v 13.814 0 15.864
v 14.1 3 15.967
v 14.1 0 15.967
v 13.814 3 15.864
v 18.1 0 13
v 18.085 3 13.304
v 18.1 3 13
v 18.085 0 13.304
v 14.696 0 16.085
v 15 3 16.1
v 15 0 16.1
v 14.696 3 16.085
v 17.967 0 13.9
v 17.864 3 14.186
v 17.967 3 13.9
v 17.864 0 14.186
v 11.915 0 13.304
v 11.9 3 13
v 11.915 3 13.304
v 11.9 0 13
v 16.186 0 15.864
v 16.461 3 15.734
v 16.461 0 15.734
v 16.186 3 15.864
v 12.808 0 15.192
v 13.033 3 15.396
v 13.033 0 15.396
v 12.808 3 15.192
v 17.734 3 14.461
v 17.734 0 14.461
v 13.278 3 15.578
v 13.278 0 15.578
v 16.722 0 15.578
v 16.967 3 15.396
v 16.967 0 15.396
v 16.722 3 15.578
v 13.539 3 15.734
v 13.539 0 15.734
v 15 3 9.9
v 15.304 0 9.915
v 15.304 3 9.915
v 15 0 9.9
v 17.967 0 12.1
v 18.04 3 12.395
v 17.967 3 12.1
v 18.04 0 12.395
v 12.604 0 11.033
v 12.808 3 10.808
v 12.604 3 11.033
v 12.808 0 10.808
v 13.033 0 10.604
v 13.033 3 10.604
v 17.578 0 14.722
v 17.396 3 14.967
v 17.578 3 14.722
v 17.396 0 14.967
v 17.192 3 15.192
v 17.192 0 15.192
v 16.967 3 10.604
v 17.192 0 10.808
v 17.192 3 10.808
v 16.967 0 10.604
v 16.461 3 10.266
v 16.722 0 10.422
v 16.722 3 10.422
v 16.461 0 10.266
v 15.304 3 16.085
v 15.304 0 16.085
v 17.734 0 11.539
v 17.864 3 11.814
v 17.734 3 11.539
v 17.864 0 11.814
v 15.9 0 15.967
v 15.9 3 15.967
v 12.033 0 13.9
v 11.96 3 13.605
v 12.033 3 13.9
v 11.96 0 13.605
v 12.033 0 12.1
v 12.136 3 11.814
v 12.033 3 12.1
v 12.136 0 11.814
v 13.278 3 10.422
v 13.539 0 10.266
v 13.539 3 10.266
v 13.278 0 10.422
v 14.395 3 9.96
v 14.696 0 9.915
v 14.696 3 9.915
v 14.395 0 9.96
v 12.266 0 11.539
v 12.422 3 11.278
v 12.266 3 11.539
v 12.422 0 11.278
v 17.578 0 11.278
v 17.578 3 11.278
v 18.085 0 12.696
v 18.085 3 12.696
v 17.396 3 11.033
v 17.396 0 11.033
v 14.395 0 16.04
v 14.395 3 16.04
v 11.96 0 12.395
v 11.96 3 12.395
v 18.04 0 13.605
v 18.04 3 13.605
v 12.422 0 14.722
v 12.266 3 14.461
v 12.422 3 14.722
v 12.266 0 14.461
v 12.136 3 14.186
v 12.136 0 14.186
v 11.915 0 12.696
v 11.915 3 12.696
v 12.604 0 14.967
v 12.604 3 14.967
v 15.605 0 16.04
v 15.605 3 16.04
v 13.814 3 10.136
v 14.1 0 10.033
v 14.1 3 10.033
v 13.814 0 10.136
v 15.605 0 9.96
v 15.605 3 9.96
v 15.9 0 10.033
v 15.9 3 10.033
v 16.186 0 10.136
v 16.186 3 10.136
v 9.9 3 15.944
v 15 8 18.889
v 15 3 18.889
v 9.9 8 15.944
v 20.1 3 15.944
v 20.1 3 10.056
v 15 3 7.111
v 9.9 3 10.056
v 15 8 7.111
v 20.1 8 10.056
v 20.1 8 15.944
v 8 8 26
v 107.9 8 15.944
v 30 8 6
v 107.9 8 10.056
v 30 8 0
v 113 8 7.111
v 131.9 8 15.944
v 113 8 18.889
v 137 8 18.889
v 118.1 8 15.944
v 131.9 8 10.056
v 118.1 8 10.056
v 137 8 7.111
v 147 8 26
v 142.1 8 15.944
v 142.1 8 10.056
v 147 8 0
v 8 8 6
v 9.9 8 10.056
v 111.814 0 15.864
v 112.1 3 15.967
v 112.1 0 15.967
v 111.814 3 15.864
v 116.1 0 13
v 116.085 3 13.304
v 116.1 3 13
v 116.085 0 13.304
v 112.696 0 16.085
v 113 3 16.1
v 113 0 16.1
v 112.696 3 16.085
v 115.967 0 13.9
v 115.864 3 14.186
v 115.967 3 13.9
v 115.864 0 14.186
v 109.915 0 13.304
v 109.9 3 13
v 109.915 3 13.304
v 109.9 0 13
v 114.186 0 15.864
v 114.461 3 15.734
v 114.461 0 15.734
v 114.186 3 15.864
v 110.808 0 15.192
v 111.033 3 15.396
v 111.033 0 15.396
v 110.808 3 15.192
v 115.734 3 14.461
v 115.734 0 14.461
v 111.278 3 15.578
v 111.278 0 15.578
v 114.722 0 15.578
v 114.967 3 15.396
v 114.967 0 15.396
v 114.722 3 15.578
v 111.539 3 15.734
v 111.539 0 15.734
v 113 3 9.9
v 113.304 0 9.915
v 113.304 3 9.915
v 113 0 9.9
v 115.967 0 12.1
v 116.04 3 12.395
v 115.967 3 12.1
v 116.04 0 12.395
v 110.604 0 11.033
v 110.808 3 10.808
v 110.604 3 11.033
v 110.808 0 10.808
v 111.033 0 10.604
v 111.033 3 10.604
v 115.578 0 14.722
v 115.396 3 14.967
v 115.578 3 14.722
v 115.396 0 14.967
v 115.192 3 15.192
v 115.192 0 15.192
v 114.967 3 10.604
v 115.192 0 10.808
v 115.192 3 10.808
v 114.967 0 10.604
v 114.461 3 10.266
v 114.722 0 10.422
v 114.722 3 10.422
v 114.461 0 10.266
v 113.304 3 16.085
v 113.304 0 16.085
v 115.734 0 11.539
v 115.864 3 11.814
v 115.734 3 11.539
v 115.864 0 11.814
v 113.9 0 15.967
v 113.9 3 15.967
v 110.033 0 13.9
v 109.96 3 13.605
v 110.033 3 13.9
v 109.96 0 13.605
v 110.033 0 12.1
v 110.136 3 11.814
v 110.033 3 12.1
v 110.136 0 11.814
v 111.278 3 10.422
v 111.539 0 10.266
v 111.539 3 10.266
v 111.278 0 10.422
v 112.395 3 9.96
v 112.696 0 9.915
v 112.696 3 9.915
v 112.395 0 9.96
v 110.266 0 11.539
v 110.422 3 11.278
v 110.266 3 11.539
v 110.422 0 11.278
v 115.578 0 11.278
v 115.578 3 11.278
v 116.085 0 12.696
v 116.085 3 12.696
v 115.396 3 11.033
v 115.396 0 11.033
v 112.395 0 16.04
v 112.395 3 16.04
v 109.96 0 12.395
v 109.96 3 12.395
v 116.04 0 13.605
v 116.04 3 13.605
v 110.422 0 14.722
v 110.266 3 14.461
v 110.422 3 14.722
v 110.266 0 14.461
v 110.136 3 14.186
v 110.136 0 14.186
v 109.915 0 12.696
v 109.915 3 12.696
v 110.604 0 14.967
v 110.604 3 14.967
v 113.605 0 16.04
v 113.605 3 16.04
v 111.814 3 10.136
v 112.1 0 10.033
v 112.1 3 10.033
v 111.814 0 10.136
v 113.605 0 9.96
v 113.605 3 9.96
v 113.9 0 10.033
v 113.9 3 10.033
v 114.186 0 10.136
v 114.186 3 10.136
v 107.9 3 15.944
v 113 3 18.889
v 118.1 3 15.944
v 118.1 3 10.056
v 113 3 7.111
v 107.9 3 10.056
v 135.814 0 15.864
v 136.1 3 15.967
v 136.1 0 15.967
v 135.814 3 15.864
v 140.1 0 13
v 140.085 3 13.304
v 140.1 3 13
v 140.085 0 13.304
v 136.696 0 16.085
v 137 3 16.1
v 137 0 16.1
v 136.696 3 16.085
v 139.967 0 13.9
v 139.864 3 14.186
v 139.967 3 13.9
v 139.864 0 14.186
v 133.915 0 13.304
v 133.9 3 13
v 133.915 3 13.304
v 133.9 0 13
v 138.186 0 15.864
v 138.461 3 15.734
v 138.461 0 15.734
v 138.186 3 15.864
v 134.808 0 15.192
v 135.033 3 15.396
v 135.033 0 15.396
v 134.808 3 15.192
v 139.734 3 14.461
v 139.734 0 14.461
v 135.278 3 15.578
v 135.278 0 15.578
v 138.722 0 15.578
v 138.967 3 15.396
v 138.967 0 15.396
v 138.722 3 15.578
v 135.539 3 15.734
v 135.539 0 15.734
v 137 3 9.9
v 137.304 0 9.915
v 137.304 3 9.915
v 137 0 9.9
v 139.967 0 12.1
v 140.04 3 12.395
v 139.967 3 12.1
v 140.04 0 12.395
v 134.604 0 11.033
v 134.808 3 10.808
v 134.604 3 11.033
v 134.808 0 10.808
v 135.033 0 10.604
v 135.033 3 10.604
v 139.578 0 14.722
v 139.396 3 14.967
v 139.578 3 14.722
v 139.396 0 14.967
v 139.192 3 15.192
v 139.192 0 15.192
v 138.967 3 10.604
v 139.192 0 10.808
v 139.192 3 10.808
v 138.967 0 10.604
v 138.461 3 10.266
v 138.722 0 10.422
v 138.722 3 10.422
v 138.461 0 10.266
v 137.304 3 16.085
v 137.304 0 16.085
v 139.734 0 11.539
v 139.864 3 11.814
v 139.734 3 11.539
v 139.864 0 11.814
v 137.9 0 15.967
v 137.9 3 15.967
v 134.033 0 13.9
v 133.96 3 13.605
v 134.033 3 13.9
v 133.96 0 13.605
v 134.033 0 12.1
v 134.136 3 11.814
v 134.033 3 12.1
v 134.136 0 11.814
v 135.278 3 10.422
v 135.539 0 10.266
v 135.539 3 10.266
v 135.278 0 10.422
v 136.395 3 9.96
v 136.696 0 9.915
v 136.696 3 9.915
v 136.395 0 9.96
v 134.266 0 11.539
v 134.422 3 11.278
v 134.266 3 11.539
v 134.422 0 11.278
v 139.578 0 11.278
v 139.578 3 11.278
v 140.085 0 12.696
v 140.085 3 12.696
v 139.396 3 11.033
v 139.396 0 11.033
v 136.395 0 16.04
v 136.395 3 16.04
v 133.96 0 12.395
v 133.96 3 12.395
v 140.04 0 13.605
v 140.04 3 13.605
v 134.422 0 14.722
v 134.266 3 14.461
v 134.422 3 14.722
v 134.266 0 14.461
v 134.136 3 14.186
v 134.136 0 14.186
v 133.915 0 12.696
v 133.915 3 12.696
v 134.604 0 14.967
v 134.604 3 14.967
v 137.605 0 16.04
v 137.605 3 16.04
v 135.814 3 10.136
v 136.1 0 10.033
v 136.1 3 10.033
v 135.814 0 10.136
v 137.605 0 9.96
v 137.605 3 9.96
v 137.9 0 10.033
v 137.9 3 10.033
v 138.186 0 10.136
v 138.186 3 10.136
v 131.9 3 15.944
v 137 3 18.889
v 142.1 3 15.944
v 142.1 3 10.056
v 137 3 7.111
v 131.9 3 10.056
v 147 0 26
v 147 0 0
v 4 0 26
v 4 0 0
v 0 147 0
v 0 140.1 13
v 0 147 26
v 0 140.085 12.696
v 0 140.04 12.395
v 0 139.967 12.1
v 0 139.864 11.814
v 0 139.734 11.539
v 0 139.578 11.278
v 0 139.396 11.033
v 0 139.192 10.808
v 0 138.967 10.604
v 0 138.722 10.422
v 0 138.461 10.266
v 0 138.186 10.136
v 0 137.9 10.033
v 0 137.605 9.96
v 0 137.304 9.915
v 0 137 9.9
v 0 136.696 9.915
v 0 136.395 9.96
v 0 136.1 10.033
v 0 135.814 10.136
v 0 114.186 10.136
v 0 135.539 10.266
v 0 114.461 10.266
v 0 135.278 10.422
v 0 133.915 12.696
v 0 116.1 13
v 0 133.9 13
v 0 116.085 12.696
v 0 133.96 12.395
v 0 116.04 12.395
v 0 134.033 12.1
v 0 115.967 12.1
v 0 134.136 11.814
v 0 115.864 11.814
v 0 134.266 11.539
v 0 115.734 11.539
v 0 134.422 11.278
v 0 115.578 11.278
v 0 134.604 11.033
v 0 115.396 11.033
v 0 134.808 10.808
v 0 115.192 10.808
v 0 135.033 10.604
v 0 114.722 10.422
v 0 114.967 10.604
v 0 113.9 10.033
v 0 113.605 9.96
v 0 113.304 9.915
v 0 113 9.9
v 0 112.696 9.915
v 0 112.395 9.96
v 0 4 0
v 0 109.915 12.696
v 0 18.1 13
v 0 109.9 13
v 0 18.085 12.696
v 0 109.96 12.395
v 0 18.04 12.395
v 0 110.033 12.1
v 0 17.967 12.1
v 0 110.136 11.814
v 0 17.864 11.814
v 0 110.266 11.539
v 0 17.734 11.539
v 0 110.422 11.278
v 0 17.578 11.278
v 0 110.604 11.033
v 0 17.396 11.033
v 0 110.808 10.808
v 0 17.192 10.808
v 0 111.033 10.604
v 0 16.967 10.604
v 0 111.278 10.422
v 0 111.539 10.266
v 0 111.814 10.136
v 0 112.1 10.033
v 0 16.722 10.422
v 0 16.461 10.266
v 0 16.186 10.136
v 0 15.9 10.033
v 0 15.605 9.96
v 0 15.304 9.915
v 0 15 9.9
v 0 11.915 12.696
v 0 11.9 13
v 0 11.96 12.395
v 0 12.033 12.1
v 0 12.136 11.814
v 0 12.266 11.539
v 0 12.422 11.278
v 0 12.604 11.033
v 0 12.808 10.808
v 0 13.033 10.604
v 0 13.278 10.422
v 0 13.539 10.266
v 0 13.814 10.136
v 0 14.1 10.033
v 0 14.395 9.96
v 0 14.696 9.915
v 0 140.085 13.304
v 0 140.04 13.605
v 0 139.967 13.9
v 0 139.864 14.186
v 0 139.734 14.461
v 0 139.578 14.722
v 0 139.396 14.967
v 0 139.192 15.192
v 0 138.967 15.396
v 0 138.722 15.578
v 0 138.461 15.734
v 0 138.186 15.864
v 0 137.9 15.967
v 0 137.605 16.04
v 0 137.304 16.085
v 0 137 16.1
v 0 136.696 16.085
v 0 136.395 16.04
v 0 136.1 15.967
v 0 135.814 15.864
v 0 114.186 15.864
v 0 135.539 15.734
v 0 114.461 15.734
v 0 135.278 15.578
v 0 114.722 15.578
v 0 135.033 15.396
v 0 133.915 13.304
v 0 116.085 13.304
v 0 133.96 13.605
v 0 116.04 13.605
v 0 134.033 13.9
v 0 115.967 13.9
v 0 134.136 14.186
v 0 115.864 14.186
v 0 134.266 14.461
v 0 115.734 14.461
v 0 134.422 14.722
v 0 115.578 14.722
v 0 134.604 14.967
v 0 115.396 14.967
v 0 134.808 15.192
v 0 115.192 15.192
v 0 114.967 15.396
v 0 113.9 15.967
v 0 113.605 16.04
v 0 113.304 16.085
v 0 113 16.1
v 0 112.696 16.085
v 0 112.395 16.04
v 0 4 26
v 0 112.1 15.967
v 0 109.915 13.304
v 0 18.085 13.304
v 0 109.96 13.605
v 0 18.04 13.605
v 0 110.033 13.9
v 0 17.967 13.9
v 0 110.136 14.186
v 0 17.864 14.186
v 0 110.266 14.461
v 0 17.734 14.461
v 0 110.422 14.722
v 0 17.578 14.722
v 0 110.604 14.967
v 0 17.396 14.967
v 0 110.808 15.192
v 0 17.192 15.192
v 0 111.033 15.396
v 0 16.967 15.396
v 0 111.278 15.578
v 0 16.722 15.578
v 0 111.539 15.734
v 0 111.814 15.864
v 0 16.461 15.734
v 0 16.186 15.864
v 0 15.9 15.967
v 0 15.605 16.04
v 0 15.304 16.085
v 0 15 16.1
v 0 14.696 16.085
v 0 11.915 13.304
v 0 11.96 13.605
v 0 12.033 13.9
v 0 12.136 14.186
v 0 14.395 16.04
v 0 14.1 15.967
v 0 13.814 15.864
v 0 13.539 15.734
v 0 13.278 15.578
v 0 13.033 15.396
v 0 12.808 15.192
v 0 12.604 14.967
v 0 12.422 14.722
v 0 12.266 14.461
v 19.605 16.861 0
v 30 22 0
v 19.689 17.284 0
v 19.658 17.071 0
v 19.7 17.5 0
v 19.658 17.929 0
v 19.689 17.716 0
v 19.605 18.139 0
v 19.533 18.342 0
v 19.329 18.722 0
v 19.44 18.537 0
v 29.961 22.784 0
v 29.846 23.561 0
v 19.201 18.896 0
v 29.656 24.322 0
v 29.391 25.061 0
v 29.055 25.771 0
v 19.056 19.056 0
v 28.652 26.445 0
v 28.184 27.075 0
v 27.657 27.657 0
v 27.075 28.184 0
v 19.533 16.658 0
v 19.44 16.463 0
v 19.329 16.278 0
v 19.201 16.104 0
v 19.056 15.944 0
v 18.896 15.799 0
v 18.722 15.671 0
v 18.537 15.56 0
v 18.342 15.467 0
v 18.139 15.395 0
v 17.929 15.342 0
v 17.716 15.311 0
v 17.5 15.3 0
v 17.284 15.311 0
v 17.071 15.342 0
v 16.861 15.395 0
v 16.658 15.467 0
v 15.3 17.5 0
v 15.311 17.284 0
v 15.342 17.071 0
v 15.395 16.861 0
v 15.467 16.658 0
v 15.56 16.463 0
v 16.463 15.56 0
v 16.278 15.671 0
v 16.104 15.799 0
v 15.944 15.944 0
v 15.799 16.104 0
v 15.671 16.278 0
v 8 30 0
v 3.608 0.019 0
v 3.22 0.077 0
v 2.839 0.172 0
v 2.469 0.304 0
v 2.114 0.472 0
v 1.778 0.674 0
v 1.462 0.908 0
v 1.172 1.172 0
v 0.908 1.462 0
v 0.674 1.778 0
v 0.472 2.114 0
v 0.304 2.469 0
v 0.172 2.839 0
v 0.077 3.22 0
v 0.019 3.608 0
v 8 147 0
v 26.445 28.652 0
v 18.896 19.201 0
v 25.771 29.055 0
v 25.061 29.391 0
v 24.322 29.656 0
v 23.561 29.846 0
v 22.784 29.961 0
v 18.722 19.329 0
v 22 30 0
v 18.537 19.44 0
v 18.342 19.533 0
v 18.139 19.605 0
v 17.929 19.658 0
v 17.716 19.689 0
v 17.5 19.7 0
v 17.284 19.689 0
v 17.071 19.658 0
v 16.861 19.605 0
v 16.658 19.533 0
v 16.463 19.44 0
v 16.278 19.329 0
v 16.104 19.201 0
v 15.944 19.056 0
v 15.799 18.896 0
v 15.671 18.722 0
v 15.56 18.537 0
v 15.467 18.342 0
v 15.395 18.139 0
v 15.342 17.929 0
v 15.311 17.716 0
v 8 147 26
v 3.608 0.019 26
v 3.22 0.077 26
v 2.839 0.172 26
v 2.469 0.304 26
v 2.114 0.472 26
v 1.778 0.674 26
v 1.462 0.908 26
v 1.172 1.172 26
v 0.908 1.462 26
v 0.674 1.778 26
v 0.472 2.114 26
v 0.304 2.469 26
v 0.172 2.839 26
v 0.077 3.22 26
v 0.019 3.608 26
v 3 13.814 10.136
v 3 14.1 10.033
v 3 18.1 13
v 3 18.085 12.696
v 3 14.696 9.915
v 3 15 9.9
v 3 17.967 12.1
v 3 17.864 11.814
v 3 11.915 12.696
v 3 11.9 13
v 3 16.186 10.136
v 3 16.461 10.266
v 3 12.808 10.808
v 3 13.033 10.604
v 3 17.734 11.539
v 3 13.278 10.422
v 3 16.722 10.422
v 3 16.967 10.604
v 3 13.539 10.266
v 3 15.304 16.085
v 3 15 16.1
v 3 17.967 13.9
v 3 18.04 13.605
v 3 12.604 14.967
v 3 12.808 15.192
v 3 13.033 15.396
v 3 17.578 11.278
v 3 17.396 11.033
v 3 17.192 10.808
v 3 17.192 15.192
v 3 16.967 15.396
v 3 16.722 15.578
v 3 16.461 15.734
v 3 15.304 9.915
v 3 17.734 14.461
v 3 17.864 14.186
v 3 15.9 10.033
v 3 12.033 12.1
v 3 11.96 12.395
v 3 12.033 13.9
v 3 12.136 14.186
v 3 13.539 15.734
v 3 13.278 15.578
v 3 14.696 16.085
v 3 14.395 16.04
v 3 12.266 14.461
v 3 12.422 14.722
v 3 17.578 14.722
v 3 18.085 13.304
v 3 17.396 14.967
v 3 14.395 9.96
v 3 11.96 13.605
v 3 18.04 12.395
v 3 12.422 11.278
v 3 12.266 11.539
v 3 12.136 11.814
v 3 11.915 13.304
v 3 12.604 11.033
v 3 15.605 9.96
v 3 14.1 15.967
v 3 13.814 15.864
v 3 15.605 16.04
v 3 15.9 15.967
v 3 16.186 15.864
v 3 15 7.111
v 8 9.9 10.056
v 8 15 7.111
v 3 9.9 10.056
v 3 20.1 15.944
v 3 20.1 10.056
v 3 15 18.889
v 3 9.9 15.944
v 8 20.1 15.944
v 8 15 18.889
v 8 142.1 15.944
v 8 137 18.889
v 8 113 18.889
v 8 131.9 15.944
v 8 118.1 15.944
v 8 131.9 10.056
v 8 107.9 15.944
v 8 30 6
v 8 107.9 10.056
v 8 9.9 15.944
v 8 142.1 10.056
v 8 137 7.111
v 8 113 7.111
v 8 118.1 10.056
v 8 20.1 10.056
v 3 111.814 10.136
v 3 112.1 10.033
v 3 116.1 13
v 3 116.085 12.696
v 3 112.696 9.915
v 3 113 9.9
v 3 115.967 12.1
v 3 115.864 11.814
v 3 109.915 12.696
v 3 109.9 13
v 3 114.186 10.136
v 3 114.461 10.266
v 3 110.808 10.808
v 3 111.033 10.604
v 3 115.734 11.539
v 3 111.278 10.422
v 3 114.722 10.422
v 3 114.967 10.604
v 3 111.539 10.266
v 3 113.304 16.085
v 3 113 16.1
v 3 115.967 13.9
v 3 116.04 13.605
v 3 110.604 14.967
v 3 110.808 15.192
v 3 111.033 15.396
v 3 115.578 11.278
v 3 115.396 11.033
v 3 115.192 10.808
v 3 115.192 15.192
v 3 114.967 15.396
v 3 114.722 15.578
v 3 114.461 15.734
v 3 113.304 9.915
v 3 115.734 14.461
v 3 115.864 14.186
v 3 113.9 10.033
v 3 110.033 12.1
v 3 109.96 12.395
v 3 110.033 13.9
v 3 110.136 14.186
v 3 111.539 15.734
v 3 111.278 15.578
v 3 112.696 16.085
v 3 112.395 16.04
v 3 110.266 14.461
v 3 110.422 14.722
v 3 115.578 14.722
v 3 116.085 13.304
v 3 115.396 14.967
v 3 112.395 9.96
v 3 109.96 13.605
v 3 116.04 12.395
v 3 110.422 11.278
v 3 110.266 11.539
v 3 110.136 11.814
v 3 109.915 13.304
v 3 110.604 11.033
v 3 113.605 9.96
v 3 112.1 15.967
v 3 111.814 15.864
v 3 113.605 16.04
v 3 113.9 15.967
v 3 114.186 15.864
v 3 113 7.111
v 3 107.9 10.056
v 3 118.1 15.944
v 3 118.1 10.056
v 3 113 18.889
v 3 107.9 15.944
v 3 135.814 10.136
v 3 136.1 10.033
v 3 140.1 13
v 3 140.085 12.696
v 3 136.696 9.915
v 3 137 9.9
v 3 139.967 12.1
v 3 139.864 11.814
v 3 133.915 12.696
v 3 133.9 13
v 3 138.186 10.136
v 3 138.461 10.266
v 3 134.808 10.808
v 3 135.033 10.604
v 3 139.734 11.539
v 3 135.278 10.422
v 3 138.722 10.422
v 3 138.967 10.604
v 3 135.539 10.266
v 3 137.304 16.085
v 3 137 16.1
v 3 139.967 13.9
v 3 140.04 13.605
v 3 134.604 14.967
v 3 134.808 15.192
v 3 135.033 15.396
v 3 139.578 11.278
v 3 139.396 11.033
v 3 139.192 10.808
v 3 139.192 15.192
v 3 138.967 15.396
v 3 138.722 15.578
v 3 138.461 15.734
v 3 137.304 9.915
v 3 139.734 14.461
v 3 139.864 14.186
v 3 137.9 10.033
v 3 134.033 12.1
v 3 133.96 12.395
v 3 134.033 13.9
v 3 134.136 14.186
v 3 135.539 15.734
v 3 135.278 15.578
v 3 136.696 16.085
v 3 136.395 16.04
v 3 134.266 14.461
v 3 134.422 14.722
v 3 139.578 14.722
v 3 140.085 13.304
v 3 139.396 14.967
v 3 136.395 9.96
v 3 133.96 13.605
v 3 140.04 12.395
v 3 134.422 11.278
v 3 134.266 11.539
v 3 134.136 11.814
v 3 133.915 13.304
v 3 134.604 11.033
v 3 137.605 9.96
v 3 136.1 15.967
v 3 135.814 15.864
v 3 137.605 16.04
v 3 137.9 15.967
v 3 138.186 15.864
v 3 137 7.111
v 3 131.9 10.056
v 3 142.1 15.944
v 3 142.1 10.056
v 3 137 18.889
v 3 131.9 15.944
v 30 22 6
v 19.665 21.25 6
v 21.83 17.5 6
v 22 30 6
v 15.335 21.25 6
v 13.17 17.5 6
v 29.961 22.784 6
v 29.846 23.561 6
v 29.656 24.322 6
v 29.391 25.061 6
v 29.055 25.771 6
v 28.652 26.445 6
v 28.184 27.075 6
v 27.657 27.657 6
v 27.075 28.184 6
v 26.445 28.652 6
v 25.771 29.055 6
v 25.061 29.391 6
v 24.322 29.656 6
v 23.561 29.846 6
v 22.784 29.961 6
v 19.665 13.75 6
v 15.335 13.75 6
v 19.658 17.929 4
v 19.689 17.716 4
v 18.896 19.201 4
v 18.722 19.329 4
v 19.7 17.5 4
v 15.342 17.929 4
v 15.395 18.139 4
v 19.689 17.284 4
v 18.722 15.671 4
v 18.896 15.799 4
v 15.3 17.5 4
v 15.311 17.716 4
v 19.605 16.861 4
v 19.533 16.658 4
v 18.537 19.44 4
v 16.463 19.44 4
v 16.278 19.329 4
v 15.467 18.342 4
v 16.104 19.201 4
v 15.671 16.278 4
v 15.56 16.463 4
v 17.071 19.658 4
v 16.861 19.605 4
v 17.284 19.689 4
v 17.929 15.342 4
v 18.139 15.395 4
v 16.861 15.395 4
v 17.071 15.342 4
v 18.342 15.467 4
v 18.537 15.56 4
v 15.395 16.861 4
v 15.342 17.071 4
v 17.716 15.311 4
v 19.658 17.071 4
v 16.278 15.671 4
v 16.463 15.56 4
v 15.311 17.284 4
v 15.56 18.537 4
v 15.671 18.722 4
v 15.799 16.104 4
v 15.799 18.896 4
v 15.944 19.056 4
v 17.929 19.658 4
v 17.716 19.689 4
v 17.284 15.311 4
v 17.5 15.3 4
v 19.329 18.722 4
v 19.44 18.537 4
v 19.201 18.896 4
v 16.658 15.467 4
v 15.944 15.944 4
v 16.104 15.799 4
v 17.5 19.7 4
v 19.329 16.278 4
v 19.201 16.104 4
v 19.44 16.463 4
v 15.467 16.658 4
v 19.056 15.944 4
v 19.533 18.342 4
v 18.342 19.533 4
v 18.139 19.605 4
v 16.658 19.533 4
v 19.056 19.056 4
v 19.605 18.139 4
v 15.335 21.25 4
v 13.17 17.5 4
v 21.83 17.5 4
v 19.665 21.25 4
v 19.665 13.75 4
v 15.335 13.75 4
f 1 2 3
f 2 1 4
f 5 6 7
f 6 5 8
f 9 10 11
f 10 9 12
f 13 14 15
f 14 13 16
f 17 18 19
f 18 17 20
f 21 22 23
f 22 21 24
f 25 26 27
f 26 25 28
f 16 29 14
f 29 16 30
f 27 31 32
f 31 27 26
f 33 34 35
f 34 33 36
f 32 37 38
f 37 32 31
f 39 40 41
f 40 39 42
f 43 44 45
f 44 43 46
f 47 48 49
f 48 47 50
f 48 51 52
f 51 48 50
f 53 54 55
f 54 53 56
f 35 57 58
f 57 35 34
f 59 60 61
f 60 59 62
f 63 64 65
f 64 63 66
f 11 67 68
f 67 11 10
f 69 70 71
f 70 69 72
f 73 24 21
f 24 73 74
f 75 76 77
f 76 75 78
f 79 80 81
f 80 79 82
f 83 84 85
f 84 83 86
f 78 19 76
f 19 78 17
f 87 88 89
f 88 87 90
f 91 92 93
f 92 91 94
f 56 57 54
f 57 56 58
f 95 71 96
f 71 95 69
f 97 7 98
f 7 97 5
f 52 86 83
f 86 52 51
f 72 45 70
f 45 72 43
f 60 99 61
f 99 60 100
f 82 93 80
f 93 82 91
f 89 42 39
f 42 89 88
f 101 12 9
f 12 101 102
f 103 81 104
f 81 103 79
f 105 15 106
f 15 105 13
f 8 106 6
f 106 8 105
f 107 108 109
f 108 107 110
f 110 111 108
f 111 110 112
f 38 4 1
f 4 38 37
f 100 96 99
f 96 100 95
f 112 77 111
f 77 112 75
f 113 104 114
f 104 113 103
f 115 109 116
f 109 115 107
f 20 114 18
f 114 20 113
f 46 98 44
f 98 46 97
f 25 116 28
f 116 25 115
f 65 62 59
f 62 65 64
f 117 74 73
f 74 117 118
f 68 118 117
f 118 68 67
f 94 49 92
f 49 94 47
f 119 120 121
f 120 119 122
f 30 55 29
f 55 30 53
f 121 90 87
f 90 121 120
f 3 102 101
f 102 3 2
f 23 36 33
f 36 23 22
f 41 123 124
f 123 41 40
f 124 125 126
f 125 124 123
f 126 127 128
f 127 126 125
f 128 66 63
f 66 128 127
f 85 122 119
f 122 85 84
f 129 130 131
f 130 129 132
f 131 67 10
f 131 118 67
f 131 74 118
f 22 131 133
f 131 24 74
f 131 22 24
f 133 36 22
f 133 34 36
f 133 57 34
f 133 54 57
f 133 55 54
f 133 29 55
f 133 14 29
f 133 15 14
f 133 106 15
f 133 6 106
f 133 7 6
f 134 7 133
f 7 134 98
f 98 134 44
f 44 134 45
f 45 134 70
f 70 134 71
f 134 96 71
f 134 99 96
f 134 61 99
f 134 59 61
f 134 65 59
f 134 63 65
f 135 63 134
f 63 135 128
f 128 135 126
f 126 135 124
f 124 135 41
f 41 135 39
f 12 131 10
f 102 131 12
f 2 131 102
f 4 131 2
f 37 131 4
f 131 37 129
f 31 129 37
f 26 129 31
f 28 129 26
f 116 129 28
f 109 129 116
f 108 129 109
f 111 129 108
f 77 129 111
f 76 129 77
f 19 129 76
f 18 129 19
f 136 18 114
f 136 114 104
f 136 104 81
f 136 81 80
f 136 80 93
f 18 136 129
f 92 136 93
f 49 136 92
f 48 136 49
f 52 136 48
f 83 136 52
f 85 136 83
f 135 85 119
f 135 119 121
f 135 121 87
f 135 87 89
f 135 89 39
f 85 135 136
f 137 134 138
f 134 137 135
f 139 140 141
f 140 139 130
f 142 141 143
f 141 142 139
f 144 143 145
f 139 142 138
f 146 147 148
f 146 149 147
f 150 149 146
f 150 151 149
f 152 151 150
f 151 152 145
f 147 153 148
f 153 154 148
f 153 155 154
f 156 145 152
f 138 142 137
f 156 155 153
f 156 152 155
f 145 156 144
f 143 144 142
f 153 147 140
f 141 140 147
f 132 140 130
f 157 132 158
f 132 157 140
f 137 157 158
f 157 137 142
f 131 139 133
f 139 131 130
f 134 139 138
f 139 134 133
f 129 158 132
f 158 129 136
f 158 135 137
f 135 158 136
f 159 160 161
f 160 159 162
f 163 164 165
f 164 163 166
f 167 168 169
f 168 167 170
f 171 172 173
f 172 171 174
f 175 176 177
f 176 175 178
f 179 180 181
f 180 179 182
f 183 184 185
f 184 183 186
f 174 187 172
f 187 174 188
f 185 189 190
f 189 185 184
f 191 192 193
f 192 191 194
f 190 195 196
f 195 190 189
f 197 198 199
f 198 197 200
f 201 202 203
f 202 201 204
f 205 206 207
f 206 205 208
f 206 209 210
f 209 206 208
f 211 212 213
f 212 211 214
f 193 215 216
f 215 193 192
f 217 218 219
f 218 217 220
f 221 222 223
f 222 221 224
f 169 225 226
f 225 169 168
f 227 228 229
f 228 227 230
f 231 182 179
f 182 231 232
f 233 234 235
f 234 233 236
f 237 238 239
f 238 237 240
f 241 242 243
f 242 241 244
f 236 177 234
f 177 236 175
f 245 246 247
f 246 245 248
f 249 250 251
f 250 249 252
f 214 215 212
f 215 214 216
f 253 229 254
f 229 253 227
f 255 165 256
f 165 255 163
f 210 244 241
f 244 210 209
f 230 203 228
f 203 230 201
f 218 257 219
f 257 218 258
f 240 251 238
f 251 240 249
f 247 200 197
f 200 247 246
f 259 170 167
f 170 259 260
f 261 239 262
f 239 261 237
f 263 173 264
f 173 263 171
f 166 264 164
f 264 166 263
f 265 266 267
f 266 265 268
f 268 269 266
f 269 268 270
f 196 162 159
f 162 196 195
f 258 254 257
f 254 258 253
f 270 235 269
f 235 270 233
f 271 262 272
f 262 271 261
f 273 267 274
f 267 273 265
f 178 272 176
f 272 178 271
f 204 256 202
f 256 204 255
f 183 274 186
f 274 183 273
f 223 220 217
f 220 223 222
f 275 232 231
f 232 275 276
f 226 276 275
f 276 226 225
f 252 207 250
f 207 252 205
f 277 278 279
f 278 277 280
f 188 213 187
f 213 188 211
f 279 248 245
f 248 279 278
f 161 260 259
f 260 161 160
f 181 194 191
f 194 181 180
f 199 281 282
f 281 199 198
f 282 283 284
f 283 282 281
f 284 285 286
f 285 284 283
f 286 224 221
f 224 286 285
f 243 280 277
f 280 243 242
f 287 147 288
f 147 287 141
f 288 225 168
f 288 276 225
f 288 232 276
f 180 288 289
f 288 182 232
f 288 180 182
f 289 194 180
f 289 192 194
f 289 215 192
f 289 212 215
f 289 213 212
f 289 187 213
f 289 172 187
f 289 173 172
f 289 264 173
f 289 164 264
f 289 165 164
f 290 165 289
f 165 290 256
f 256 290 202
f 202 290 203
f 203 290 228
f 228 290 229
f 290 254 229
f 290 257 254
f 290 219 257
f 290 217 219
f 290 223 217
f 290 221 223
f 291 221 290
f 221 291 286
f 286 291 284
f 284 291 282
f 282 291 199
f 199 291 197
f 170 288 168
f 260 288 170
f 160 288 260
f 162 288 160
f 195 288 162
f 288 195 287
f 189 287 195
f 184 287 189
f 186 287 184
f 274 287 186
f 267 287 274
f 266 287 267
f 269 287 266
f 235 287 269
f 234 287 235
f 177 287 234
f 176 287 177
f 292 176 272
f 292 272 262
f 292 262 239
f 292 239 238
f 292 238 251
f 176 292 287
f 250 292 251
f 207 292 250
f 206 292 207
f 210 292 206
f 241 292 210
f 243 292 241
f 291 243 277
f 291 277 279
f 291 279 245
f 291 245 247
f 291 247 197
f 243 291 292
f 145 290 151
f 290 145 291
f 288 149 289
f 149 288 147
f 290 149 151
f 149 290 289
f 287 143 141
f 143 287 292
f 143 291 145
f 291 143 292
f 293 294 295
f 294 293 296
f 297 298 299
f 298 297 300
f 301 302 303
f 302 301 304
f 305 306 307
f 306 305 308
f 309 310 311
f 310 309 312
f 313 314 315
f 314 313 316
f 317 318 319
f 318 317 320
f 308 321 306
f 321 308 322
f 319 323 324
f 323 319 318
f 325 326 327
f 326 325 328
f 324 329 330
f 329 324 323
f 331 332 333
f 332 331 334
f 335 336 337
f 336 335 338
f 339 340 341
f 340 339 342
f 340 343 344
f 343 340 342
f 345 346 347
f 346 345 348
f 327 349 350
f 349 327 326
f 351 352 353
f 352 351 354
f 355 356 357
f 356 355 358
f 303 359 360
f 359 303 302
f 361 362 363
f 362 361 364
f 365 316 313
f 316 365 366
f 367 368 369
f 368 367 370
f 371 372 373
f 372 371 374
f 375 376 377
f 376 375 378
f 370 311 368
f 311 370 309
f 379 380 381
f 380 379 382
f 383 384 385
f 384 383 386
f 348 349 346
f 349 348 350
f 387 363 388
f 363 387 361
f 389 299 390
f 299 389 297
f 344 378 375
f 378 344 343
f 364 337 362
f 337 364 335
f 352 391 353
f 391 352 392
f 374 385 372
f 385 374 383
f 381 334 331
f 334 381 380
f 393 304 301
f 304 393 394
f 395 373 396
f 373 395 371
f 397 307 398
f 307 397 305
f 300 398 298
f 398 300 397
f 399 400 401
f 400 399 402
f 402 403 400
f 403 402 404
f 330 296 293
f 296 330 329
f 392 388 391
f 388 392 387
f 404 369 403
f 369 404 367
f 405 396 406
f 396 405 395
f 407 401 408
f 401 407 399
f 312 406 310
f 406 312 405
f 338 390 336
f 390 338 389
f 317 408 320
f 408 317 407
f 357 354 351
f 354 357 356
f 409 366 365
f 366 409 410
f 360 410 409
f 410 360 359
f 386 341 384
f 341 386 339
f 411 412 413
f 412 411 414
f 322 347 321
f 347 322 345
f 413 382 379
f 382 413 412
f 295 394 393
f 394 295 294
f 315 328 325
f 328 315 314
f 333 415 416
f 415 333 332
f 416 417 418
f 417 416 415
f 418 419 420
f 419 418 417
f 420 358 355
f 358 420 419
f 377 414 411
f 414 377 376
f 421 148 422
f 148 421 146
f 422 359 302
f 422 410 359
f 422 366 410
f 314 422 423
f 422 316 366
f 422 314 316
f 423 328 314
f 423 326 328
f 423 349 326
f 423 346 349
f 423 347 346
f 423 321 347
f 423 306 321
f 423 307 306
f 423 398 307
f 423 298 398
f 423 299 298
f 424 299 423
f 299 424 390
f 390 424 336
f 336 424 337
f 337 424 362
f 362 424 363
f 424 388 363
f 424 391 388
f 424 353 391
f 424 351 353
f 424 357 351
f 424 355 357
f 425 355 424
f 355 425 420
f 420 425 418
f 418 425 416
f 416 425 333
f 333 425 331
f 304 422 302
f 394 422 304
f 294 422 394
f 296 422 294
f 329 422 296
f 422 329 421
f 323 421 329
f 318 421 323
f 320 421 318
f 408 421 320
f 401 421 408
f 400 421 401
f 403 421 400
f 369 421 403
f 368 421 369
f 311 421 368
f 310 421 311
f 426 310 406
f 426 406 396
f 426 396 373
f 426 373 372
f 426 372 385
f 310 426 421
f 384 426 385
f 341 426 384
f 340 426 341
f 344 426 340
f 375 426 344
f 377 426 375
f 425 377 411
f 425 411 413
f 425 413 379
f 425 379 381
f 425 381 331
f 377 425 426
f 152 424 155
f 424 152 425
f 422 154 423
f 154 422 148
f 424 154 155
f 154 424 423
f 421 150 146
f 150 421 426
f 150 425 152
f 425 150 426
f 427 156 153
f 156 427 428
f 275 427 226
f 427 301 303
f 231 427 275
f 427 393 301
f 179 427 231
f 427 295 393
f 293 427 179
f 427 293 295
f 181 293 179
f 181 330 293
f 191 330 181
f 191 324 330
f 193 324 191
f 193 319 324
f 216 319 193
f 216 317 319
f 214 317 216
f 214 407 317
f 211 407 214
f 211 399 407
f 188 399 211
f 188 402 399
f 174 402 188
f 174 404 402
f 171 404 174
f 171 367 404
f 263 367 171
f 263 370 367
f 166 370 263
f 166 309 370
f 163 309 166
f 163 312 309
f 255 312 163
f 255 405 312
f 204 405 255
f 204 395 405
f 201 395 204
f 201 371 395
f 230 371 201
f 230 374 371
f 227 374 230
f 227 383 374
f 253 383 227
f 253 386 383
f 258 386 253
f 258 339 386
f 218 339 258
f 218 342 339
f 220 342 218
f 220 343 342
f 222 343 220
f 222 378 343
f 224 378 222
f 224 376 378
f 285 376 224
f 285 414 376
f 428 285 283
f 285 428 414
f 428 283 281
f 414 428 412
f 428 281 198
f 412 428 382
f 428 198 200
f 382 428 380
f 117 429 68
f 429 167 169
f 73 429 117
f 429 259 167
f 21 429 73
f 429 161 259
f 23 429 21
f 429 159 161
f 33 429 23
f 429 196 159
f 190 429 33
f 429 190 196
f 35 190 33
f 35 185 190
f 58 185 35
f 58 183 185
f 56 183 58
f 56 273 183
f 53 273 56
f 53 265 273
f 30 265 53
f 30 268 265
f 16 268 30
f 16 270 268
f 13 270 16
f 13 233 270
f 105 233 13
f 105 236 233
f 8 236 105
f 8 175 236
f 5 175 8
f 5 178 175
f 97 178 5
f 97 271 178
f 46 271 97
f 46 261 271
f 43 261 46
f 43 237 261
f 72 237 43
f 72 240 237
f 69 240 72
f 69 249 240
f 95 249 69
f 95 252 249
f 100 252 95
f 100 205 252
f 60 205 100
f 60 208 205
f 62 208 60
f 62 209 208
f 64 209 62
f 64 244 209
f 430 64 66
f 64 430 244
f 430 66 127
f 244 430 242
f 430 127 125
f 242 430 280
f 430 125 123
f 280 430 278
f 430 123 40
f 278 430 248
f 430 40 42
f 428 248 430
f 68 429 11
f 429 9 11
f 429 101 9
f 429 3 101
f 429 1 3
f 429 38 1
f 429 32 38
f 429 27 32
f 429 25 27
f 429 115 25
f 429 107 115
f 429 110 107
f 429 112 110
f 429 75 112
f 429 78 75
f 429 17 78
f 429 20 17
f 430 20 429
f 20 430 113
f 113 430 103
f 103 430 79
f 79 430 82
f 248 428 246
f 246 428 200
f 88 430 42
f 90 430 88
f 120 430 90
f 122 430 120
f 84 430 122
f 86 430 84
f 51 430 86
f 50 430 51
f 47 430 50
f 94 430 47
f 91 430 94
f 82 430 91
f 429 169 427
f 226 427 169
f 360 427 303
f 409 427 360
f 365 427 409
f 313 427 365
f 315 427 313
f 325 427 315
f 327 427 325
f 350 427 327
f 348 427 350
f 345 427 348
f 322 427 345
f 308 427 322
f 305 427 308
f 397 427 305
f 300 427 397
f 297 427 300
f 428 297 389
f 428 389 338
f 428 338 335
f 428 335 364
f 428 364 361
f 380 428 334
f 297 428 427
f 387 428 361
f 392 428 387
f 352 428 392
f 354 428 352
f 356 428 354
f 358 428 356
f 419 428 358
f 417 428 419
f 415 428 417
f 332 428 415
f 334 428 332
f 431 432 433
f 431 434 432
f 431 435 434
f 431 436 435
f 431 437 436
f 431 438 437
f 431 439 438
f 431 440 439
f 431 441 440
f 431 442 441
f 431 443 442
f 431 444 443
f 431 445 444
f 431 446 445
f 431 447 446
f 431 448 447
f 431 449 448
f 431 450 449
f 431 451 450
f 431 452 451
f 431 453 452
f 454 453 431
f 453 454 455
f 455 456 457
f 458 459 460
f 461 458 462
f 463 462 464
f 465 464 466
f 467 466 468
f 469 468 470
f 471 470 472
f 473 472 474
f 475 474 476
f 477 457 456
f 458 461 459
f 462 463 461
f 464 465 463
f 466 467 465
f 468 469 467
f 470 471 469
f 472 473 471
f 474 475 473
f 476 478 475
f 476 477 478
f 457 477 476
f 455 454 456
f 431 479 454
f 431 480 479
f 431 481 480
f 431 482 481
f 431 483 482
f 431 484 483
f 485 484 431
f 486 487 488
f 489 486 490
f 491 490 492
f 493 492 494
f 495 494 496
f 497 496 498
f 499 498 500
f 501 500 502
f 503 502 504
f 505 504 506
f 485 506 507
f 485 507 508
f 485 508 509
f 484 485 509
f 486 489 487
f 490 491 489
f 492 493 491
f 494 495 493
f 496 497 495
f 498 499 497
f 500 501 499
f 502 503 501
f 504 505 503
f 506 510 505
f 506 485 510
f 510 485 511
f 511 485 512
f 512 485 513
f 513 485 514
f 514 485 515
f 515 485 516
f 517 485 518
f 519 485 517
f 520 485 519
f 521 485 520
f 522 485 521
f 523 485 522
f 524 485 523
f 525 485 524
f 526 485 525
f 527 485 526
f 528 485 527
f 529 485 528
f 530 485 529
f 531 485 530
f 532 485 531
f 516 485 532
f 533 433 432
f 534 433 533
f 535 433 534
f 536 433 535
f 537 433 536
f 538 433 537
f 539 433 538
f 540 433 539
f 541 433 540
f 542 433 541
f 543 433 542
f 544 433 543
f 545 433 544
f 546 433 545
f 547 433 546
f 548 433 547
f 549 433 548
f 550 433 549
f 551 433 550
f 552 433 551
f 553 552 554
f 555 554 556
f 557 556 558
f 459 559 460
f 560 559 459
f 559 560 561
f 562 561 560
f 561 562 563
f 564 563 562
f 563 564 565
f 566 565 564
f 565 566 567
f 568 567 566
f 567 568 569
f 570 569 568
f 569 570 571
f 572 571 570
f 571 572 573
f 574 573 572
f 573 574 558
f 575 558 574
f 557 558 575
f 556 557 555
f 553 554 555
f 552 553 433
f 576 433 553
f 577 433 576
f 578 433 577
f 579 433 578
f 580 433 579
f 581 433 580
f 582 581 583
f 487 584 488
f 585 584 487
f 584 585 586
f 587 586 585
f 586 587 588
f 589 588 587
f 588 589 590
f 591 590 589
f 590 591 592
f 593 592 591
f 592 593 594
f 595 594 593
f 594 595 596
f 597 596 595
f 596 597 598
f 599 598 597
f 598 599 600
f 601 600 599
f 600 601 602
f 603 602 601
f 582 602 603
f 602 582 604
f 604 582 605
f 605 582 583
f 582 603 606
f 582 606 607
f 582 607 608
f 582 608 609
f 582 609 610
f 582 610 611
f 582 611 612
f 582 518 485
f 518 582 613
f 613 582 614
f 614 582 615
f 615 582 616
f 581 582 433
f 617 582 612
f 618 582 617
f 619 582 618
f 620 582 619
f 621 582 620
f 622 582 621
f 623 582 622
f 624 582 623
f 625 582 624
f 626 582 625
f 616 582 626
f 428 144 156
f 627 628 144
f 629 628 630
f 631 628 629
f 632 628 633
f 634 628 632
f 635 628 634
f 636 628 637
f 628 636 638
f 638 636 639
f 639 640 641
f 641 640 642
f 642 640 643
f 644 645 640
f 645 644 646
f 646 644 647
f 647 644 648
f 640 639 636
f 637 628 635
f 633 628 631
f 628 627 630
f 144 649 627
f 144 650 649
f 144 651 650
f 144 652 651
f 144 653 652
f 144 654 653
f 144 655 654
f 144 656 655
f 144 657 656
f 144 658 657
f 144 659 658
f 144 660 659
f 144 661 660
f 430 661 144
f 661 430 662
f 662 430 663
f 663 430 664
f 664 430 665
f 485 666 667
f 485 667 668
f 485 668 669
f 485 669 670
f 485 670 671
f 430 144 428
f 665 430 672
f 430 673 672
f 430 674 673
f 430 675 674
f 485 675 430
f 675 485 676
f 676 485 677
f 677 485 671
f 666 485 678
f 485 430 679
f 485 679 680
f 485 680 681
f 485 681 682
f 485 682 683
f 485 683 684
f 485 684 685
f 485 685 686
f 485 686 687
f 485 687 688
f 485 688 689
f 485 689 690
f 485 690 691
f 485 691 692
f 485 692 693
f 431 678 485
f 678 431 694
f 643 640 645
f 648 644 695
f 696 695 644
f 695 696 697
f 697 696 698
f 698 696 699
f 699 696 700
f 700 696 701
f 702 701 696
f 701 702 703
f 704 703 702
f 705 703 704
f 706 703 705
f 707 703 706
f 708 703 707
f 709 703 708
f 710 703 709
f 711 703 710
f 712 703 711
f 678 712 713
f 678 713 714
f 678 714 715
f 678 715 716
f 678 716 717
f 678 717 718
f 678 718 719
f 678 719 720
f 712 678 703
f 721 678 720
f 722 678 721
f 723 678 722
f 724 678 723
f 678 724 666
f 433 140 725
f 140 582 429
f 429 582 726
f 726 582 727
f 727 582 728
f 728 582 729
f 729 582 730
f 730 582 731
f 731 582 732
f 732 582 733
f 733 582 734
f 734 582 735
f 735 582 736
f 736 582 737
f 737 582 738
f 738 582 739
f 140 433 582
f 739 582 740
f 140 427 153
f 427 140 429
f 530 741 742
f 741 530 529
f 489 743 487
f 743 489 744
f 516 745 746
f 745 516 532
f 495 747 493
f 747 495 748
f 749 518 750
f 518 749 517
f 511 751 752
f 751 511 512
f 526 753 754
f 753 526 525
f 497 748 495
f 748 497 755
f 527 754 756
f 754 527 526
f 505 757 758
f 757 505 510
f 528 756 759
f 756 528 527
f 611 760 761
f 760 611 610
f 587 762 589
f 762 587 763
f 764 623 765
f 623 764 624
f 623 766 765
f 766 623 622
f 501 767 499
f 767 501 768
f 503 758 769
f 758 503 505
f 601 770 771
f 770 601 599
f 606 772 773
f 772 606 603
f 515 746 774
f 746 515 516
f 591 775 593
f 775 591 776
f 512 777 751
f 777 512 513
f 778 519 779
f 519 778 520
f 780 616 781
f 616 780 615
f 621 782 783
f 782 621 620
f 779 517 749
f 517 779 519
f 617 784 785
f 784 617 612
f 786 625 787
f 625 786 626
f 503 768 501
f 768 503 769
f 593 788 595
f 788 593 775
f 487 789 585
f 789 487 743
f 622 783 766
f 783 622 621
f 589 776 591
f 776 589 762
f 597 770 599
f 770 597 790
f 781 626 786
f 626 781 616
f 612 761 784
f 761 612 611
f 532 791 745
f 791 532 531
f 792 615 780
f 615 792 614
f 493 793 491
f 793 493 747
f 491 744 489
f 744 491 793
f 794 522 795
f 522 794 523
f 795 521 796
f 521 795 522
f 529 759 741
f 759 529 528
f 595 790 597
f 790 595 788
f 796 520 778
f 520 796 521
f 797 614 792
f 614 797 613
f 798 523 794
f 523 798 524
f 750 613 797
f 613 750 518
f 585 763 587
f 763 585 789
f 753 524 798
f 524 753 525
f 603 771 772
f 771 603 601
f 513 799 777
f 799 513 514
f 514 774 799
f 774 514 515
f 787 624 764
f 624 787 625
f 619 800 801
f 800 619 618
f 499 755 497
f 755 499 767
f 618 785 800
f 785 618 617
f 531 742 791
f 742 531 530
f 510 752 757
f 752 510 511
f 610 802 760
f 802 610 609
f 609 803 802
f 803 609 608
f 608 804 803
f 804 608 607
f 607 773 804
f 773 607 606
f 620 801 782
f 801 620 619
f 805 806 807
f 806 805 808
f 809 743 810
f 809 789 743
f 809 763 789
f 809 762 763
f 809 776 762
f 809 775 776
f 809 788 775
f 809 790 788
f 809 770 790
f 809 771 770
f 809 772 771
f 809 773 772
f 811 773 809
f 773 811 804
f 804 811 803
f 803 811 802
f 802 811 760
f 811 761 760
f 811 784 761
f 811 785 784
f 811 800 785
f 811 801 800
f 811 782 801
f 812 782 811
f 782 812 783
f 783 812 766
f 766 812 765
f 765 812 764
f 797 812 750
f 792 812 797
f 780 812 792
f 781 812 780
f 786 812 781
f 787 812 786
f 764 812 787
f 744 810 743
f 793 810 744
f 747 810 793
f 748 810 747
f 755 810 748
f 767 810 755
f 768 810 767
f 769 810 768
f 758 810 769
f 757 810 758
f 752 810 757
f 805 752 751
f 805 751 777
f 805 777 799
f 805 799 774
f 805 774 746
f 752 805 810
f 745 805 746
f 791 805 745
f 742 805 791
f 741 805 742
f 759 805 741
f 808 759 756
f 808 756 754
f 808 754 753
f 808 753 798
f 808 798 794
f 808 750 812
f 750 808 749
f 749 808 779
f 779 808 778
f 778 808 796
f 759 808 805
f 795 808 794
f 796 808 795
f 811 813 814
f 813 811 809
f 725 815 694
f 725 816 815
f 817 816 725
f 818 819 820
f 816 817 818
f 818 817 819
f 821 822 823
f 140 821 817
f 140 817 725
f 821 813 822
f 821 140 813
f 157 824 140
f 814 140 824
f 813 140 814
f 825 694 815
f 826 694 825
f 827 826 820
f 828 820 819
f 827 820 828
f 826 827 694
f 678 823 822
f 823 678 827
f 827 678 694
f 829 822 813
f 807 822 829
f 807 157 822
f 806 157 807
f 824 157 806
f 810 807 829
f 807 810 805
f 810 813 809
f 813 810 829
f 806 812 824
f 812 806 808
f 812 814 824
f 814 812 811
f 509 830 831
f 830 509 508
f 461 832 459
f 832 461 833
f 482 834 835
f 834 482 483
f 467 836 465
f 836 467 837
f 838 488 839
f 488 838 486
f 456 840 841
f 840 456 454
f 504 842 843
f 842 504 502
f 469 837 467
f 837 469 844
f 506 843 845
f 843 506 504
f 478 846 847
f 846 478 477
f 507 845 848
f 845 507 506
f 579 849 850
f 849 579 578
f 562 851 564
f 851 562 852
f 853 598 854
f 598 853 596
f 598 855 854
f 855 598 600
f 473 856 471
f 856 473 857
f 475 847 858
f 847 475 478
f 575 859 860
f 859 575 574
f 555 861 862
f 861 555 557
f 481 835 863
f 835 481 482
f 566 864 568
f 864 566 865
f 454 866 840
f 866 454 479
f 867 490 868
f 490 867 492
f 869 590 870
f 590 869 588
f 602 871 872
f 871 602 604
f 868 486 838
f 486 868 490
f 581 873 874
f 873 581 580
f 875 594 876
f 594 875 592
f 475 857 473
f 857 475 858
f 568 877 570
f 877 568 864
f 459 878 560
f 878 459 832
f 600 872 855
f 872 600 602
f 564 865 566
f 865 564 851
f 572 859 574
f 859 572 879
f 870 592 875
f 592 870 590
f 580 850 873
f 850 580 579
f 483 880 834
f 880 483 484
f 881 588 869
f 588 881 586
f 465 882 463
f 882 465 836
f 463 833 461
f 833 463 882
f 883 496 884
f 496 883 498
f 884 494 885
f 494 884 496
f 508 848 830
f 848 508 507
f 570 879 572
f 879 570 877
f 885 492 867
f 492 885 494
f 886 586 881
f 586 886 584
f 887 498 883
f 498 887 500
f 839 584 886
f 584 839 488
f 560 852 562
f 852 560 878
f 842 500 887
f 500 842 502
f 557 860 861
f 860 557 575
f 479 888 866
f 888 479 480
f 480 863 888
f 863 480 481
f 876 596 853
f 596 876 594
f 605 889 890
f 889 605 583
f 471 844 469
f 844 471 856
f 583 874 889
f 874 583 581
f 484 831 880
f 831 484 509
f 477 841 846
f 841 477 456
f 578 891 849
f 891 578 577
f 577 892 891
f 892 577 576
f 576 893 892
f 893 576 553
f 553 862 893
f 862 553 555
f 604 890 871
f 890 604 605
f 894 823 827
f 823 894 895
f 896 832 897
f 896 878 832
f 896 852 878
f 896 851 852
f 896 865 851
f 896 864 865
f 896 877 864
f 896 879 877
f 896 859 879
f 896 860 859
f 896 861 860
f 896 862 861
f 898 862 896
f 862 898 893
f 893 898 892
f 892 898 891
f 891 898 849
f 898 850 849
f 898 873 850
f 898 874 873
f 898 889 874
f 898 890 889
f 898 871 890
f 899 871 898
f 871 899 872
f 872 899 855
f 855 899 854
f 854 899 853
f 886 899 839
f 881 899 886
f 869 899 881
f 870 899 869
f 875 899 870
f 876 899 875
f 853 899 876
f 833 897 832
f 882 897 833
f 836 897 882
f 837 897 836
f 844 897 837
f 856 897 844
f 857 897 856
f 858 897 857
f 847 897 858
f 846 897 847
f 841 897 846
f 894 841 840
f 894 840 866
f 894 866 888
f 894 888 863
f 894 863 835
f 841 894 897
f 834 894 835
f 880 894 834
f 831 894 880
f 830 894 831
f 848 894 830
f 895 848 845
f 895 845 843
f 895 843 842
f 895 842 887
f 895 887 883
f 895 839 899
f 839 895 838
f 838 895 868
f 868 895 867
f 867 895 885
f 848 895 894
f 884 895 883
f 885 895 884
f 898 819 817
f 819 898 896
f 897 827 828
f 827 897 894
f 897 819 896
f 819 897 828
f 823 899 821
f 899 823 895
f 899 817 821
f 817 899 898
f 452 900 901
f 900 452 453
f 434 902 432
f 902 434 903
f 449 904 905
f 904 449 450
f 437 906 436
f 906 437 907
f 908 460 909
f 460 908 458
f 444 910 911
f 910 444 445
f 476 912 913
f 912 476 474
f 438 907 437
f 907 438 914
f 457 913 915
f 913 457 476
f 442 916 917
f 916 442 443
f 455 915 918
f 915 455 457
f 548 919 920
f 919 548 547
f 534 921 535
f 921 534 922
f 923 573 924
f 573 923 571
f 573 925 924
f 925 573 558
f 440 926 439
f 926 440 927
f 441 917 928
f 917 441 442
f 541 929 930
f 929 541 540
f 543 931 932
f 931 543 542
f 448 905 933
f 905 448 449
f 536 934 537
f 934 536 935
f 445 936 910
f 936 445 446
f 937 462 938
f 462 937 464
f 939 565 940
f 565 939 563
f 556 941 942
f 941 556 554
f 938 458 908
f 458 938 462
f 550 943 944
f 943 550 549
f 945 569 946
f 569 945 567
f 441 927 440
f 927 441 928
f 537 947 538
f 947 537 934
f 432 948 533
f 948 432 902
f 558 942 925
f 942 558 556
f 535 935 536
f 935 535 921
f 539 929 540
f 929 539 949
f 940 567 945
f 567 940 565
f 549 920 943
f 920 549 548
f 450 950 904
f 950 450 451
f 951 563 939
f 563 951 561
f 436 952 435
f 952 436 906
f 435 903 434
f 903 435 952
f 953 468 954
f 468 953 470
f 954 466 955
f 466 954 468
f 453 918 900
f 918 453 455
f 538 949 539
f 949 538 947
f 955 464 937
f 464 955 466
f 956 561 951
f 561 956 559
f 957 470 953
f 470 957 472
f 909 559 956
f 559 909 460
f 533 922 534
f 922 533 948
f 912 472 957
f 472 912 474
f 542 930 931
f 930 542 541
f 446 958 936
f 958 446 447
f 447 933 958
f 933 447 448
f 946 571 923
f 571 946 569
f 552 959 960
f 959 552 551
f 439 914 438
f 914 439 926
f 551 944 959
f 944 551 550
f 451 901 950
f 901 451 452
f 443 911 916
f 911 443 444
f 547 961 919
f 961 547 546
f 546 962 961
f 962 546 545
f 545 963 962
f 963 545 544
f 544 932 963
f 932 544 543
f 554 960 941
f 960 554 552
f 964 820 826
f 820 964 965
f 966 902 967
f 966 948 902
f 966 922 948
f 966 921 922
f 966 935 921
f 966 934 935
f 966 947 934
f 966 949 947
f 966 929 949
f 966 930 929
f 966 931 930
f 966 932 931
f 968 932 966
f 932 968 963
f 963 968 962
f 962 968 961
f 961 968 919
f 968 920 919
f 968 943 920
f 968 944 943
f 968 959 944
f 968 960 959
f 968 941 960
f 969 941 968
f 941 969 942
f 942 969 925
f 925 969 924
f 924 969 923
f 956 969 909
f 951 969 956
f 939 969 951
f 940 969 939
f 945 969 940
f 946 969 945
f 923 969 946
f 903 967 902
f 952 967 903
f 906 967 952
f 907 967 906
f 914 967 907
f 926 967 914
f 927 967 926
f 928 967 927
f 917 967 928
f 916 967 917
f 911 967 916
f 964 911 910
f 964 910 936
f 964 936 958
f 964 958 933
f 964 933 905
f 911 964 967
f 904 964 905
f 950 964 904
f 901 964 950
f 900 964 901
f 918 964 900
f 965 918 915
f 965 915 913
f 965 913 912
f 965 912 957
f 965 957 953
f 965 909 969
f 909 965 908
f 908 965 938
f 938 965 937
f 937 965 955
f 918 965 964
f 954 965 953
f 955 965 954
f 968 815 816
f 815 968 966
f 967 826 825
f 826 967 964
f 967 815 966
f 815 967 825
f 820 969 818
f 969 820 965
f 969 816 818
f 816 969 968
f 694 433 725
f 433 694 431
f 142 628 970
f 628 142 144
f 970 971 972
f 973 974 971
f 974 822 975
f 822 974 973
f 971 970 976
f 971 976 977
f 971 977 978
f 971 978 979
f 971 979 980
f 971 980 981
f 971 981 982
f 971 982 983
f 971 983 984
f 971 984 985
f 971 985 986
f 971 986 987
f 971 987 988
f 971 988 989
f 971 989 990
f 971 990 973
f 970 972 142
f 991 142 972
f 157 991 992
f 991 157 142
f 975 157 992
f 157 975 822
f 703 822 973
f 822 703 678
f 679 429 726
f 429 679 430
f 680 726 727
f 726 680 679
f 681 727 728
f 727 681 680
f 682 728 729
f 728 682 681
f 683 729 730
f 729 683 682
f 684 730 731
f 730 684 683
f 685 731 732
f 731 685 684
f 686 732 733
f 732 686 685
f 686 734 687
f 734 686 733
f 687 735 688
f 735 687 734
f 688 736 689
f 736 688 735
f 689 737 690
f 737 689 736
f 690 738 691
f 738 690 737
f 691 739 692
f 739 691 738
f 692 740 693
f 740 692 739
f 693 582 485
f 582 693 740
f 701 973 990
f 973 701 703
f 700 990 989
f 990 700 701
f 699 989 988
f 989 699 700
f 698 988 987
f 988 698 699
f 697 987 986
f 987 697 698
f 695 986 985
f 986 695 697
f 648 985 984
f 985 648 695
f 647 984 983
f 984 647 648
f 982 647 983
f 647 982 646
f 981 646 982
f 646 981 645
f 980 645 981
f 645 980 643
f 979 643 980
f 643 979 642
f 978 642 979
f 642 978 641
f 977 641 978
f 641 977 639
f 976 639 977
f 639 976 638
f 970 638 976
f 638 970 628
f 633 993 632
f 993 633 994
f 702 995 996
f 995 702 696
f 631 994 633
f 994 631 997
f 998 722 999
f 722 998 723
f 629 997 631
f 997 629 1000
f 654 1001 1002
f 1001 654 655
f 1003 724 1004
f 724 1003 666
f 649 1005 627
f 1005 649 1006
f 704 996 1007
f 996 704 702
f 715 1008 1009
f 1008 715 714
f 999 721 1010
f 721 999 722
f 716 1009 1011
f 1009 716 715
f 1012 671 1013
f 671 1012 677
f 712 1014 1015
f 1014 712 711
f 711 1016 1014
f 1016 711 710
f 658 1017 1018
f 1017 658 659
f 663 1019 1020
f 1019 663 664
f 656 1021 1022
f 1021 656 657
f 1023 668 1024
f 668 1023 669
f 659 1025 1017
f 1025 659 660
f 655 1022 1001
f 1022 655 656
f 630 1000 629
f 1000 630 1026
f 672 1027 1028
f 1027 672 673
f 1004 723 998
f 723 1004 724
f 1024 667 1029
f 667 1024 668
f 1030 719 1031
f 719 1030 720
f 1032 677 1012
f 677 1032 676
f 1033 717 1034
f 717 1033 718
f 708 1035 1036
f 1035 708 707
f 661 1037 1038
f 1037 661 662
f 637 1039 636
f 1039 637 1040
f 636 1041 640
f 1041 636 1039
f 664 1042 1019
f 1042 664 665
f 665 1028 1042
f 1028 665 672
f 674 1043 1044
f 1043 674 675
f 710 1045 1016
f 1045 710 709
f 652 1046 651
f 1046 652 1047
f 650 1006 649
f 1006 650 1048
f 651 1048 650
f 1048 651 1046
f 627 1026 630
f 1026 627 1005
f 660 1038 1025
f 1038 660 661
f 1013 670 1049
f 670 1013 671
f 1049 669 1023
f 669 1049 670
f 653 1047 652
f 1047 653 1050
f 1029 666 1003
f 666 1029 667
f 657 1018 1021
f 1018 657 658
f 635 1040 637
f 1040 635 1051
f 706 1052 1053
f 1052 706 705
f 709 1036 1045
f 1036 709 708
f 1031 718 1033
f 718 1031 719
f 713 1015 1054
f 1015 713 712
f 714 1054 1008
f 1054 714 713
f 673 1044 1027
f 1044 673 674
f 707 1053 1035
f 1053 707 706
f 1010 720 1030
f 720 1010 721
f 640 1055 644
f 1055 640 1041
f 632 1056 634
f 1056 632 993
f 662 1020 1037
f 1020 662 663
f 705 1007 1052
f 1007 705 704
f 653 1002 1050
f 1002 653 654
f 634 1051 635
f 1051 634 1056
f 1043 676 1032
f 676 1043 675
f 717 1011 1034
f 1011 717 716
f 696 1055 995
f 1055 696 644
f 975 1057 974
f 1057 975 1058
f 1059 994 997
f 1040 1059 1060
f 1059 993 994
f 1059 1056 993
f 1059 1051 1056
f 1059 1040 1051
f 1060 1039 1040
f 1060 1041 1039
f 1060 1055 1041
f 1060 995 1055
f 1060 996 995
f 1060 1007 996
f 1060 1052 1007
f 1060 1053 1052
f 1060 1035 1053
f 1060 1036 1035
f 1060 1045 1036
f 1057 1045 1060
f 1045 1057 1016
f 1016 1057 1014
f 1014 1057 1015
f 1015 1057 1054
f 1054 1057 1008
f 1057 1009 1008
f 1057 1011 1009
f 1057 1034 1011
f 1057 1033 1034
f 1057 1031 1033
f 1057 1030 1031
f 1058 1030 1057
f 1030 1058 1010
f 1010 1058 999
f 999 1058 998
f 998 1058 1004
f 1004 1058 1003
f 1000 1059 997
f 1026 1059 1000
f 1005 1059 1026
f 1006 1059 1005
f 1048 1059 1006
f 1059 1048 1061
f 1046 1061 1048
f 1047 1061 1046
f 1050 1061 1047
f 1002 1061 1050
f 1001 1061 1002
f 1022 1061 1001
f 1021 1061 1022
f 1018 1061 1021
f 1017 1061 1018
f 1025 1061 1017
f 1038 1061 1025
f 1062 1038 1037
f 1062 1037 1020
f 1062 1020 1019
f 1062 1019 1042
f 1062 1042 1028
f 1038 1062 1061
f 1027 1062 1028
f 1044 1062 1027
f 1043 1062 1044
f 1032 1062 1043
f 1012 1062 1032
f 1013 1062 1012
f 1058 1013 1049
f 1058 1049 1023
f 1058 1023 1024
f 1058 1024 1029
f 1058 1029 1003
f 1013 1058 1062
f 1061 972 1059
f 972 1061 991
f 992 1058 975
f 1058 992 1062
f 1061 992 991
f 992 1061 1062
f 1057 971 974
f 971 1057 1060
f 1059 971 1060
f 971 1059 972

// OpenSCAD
// file: ../../../modules/steel_rack.scad
use <bolts.scad>;

bolt_edge_offset = 15;
bolt_positions = [
  bolt_edge_offset,
  bolt_edge_offset + 98,
  bolt_edge_offset + 98 + 24,
];

module bolt_and_nut(y, h) {
  nut_thickness = 5;
  translate([0, y, h / 2])
    m6_bolt_hole(h + 1, center = true);
  translate([0, y, h - nut_thickness / 2])
    rotate([0, 0, 90])
    m6_nut_trap(nut_thickness, center = true);
}

module long_bar(w, y, h) {
  difference() {
    translate([w / 2, y / 2, h / 2])
      cube([w, y, h], center = true);

    for (x = bolt_positions) {
      translate([x, 0, 0])
        bolt_and_nut(y / 2, h);
    }
  }
}

module short_bar(w, y, h) {
  difference() {
    translate([w / 2, y / 2, h / 2])
      cube([w, y, h], center = true);

    translate([bolt_positions[0], 0, 0])
      bolt_and_nut(y / 2, h);
  }
}

module fillet_profile(r, h) {
  linear_extrude(height = h, center = true)
    difference() {
      square([r, r]);
      circle(r = r, $fn = 64);
    }
}
// file: ../../../modules/bolts.scad
module nut_trap(d, h, center = true) {
  linear_extrude(height = h, center = center)
  circle(d = d / cos(30), $fn = 6);
}

module bolt_hole(d, h, center = true) {
  linear_extrude(height = h, center = center)
  circle(d = d, $fn = 64);
}

// Hex holes for self-tapping (nominal - 0.2mm)
module hex_hole(flat_d, h) {
  linear_extrude(height = h, center = true)
  circle(d = flat_d / cos(30), $fn = 6);
}

module m3_bolt_hexhole(h) {
  rotate([0, 0, 90]) hex_hole(flat_d = 2.8, h = h);
}

module m4_bolt_hexhole(h) {
  rotate([0, 0, 90]) hex_hole(flat_d = 3.8, h = h);
}

module m6_bolt_hexhole(h) {
  rotate([0, 0, 90]) hex_hole(flat_d = 5.8, h = h);
}

module m8_bolt_hexhole(h) {
  rotate([0, 0, 90]) hex_hole(flat_d = 7.8, h = h);
}

// M3
module m3_bolt_hole(h, center = false) { bolt_hole(d = 3.4, h = h, center = center); }
module m3_nut_trap(h, center = false) { nut_trap(d = 5.7, h = h, center = center); }

// M4
module m4_bolt_hole(h, center = false) { bolt_hole(d = 4.4, h = h, center = center); }
module m4_nut_trap(h, center = false) { nut_trap(d = 7.5, h = h, center = center); }

// M6
module m6_bolt_hole(h, center = false) { bolt_hole(d = 6.2, h = h, center = center); }
module m6_nut_trap(h, center = false) { nut_trap(d = 10.2, h = h, center = center); }

// M8
module m8_bolt_hole(h, center = false) { bolt_hole(d = 8.4, h = h, center = center); }
module m8_nut_trap(h, center = false) { nut_trap(d = 13.3, h = h, center = center); }
// main file
use <../../../modules/bolts.scad>;
use <../../../modules/steel_rack.scad>;

width = 147;
height = 26;
deps = 8;
inner_radius = 4;
plate_corner_radius = 8;

difference() {
  union() {
    translate([0, 0, height])
      rotate([90, 180, 180])
      long_bar(width, height, deps);

    translate([0, 0, 0])
      rotate([90, 0, 90])
      long_bar(width, height, deps);

    cube([30, 30, 6]);
  }

  // Inner corner fillet
  translate([inner_radius, inner_radius, -0.1])
    rotate([0, 0, 180])
    fillet_profile(inner_radius, (height * 2) + 1.2);

  // Outer corner fillet (plate)
  translate([30 - plate_corner_radius, 30 - plate_corner_radius, -0.1])
    linear_extrude(height = 6.2)
    difference() {
      square([plate_corner_radius, plate_corner_radius]);
      circle(r = plate_corner_radius, $fn = 64);
    }

  // M4 bolt + nut (plate)
  translate([17.5, 17.5, -0.1])
    m4_bolt_hole(h = 6.5);

  translate([17.5, 17.5, 4])
    m4_nut_trap(h = 2.5);
}
